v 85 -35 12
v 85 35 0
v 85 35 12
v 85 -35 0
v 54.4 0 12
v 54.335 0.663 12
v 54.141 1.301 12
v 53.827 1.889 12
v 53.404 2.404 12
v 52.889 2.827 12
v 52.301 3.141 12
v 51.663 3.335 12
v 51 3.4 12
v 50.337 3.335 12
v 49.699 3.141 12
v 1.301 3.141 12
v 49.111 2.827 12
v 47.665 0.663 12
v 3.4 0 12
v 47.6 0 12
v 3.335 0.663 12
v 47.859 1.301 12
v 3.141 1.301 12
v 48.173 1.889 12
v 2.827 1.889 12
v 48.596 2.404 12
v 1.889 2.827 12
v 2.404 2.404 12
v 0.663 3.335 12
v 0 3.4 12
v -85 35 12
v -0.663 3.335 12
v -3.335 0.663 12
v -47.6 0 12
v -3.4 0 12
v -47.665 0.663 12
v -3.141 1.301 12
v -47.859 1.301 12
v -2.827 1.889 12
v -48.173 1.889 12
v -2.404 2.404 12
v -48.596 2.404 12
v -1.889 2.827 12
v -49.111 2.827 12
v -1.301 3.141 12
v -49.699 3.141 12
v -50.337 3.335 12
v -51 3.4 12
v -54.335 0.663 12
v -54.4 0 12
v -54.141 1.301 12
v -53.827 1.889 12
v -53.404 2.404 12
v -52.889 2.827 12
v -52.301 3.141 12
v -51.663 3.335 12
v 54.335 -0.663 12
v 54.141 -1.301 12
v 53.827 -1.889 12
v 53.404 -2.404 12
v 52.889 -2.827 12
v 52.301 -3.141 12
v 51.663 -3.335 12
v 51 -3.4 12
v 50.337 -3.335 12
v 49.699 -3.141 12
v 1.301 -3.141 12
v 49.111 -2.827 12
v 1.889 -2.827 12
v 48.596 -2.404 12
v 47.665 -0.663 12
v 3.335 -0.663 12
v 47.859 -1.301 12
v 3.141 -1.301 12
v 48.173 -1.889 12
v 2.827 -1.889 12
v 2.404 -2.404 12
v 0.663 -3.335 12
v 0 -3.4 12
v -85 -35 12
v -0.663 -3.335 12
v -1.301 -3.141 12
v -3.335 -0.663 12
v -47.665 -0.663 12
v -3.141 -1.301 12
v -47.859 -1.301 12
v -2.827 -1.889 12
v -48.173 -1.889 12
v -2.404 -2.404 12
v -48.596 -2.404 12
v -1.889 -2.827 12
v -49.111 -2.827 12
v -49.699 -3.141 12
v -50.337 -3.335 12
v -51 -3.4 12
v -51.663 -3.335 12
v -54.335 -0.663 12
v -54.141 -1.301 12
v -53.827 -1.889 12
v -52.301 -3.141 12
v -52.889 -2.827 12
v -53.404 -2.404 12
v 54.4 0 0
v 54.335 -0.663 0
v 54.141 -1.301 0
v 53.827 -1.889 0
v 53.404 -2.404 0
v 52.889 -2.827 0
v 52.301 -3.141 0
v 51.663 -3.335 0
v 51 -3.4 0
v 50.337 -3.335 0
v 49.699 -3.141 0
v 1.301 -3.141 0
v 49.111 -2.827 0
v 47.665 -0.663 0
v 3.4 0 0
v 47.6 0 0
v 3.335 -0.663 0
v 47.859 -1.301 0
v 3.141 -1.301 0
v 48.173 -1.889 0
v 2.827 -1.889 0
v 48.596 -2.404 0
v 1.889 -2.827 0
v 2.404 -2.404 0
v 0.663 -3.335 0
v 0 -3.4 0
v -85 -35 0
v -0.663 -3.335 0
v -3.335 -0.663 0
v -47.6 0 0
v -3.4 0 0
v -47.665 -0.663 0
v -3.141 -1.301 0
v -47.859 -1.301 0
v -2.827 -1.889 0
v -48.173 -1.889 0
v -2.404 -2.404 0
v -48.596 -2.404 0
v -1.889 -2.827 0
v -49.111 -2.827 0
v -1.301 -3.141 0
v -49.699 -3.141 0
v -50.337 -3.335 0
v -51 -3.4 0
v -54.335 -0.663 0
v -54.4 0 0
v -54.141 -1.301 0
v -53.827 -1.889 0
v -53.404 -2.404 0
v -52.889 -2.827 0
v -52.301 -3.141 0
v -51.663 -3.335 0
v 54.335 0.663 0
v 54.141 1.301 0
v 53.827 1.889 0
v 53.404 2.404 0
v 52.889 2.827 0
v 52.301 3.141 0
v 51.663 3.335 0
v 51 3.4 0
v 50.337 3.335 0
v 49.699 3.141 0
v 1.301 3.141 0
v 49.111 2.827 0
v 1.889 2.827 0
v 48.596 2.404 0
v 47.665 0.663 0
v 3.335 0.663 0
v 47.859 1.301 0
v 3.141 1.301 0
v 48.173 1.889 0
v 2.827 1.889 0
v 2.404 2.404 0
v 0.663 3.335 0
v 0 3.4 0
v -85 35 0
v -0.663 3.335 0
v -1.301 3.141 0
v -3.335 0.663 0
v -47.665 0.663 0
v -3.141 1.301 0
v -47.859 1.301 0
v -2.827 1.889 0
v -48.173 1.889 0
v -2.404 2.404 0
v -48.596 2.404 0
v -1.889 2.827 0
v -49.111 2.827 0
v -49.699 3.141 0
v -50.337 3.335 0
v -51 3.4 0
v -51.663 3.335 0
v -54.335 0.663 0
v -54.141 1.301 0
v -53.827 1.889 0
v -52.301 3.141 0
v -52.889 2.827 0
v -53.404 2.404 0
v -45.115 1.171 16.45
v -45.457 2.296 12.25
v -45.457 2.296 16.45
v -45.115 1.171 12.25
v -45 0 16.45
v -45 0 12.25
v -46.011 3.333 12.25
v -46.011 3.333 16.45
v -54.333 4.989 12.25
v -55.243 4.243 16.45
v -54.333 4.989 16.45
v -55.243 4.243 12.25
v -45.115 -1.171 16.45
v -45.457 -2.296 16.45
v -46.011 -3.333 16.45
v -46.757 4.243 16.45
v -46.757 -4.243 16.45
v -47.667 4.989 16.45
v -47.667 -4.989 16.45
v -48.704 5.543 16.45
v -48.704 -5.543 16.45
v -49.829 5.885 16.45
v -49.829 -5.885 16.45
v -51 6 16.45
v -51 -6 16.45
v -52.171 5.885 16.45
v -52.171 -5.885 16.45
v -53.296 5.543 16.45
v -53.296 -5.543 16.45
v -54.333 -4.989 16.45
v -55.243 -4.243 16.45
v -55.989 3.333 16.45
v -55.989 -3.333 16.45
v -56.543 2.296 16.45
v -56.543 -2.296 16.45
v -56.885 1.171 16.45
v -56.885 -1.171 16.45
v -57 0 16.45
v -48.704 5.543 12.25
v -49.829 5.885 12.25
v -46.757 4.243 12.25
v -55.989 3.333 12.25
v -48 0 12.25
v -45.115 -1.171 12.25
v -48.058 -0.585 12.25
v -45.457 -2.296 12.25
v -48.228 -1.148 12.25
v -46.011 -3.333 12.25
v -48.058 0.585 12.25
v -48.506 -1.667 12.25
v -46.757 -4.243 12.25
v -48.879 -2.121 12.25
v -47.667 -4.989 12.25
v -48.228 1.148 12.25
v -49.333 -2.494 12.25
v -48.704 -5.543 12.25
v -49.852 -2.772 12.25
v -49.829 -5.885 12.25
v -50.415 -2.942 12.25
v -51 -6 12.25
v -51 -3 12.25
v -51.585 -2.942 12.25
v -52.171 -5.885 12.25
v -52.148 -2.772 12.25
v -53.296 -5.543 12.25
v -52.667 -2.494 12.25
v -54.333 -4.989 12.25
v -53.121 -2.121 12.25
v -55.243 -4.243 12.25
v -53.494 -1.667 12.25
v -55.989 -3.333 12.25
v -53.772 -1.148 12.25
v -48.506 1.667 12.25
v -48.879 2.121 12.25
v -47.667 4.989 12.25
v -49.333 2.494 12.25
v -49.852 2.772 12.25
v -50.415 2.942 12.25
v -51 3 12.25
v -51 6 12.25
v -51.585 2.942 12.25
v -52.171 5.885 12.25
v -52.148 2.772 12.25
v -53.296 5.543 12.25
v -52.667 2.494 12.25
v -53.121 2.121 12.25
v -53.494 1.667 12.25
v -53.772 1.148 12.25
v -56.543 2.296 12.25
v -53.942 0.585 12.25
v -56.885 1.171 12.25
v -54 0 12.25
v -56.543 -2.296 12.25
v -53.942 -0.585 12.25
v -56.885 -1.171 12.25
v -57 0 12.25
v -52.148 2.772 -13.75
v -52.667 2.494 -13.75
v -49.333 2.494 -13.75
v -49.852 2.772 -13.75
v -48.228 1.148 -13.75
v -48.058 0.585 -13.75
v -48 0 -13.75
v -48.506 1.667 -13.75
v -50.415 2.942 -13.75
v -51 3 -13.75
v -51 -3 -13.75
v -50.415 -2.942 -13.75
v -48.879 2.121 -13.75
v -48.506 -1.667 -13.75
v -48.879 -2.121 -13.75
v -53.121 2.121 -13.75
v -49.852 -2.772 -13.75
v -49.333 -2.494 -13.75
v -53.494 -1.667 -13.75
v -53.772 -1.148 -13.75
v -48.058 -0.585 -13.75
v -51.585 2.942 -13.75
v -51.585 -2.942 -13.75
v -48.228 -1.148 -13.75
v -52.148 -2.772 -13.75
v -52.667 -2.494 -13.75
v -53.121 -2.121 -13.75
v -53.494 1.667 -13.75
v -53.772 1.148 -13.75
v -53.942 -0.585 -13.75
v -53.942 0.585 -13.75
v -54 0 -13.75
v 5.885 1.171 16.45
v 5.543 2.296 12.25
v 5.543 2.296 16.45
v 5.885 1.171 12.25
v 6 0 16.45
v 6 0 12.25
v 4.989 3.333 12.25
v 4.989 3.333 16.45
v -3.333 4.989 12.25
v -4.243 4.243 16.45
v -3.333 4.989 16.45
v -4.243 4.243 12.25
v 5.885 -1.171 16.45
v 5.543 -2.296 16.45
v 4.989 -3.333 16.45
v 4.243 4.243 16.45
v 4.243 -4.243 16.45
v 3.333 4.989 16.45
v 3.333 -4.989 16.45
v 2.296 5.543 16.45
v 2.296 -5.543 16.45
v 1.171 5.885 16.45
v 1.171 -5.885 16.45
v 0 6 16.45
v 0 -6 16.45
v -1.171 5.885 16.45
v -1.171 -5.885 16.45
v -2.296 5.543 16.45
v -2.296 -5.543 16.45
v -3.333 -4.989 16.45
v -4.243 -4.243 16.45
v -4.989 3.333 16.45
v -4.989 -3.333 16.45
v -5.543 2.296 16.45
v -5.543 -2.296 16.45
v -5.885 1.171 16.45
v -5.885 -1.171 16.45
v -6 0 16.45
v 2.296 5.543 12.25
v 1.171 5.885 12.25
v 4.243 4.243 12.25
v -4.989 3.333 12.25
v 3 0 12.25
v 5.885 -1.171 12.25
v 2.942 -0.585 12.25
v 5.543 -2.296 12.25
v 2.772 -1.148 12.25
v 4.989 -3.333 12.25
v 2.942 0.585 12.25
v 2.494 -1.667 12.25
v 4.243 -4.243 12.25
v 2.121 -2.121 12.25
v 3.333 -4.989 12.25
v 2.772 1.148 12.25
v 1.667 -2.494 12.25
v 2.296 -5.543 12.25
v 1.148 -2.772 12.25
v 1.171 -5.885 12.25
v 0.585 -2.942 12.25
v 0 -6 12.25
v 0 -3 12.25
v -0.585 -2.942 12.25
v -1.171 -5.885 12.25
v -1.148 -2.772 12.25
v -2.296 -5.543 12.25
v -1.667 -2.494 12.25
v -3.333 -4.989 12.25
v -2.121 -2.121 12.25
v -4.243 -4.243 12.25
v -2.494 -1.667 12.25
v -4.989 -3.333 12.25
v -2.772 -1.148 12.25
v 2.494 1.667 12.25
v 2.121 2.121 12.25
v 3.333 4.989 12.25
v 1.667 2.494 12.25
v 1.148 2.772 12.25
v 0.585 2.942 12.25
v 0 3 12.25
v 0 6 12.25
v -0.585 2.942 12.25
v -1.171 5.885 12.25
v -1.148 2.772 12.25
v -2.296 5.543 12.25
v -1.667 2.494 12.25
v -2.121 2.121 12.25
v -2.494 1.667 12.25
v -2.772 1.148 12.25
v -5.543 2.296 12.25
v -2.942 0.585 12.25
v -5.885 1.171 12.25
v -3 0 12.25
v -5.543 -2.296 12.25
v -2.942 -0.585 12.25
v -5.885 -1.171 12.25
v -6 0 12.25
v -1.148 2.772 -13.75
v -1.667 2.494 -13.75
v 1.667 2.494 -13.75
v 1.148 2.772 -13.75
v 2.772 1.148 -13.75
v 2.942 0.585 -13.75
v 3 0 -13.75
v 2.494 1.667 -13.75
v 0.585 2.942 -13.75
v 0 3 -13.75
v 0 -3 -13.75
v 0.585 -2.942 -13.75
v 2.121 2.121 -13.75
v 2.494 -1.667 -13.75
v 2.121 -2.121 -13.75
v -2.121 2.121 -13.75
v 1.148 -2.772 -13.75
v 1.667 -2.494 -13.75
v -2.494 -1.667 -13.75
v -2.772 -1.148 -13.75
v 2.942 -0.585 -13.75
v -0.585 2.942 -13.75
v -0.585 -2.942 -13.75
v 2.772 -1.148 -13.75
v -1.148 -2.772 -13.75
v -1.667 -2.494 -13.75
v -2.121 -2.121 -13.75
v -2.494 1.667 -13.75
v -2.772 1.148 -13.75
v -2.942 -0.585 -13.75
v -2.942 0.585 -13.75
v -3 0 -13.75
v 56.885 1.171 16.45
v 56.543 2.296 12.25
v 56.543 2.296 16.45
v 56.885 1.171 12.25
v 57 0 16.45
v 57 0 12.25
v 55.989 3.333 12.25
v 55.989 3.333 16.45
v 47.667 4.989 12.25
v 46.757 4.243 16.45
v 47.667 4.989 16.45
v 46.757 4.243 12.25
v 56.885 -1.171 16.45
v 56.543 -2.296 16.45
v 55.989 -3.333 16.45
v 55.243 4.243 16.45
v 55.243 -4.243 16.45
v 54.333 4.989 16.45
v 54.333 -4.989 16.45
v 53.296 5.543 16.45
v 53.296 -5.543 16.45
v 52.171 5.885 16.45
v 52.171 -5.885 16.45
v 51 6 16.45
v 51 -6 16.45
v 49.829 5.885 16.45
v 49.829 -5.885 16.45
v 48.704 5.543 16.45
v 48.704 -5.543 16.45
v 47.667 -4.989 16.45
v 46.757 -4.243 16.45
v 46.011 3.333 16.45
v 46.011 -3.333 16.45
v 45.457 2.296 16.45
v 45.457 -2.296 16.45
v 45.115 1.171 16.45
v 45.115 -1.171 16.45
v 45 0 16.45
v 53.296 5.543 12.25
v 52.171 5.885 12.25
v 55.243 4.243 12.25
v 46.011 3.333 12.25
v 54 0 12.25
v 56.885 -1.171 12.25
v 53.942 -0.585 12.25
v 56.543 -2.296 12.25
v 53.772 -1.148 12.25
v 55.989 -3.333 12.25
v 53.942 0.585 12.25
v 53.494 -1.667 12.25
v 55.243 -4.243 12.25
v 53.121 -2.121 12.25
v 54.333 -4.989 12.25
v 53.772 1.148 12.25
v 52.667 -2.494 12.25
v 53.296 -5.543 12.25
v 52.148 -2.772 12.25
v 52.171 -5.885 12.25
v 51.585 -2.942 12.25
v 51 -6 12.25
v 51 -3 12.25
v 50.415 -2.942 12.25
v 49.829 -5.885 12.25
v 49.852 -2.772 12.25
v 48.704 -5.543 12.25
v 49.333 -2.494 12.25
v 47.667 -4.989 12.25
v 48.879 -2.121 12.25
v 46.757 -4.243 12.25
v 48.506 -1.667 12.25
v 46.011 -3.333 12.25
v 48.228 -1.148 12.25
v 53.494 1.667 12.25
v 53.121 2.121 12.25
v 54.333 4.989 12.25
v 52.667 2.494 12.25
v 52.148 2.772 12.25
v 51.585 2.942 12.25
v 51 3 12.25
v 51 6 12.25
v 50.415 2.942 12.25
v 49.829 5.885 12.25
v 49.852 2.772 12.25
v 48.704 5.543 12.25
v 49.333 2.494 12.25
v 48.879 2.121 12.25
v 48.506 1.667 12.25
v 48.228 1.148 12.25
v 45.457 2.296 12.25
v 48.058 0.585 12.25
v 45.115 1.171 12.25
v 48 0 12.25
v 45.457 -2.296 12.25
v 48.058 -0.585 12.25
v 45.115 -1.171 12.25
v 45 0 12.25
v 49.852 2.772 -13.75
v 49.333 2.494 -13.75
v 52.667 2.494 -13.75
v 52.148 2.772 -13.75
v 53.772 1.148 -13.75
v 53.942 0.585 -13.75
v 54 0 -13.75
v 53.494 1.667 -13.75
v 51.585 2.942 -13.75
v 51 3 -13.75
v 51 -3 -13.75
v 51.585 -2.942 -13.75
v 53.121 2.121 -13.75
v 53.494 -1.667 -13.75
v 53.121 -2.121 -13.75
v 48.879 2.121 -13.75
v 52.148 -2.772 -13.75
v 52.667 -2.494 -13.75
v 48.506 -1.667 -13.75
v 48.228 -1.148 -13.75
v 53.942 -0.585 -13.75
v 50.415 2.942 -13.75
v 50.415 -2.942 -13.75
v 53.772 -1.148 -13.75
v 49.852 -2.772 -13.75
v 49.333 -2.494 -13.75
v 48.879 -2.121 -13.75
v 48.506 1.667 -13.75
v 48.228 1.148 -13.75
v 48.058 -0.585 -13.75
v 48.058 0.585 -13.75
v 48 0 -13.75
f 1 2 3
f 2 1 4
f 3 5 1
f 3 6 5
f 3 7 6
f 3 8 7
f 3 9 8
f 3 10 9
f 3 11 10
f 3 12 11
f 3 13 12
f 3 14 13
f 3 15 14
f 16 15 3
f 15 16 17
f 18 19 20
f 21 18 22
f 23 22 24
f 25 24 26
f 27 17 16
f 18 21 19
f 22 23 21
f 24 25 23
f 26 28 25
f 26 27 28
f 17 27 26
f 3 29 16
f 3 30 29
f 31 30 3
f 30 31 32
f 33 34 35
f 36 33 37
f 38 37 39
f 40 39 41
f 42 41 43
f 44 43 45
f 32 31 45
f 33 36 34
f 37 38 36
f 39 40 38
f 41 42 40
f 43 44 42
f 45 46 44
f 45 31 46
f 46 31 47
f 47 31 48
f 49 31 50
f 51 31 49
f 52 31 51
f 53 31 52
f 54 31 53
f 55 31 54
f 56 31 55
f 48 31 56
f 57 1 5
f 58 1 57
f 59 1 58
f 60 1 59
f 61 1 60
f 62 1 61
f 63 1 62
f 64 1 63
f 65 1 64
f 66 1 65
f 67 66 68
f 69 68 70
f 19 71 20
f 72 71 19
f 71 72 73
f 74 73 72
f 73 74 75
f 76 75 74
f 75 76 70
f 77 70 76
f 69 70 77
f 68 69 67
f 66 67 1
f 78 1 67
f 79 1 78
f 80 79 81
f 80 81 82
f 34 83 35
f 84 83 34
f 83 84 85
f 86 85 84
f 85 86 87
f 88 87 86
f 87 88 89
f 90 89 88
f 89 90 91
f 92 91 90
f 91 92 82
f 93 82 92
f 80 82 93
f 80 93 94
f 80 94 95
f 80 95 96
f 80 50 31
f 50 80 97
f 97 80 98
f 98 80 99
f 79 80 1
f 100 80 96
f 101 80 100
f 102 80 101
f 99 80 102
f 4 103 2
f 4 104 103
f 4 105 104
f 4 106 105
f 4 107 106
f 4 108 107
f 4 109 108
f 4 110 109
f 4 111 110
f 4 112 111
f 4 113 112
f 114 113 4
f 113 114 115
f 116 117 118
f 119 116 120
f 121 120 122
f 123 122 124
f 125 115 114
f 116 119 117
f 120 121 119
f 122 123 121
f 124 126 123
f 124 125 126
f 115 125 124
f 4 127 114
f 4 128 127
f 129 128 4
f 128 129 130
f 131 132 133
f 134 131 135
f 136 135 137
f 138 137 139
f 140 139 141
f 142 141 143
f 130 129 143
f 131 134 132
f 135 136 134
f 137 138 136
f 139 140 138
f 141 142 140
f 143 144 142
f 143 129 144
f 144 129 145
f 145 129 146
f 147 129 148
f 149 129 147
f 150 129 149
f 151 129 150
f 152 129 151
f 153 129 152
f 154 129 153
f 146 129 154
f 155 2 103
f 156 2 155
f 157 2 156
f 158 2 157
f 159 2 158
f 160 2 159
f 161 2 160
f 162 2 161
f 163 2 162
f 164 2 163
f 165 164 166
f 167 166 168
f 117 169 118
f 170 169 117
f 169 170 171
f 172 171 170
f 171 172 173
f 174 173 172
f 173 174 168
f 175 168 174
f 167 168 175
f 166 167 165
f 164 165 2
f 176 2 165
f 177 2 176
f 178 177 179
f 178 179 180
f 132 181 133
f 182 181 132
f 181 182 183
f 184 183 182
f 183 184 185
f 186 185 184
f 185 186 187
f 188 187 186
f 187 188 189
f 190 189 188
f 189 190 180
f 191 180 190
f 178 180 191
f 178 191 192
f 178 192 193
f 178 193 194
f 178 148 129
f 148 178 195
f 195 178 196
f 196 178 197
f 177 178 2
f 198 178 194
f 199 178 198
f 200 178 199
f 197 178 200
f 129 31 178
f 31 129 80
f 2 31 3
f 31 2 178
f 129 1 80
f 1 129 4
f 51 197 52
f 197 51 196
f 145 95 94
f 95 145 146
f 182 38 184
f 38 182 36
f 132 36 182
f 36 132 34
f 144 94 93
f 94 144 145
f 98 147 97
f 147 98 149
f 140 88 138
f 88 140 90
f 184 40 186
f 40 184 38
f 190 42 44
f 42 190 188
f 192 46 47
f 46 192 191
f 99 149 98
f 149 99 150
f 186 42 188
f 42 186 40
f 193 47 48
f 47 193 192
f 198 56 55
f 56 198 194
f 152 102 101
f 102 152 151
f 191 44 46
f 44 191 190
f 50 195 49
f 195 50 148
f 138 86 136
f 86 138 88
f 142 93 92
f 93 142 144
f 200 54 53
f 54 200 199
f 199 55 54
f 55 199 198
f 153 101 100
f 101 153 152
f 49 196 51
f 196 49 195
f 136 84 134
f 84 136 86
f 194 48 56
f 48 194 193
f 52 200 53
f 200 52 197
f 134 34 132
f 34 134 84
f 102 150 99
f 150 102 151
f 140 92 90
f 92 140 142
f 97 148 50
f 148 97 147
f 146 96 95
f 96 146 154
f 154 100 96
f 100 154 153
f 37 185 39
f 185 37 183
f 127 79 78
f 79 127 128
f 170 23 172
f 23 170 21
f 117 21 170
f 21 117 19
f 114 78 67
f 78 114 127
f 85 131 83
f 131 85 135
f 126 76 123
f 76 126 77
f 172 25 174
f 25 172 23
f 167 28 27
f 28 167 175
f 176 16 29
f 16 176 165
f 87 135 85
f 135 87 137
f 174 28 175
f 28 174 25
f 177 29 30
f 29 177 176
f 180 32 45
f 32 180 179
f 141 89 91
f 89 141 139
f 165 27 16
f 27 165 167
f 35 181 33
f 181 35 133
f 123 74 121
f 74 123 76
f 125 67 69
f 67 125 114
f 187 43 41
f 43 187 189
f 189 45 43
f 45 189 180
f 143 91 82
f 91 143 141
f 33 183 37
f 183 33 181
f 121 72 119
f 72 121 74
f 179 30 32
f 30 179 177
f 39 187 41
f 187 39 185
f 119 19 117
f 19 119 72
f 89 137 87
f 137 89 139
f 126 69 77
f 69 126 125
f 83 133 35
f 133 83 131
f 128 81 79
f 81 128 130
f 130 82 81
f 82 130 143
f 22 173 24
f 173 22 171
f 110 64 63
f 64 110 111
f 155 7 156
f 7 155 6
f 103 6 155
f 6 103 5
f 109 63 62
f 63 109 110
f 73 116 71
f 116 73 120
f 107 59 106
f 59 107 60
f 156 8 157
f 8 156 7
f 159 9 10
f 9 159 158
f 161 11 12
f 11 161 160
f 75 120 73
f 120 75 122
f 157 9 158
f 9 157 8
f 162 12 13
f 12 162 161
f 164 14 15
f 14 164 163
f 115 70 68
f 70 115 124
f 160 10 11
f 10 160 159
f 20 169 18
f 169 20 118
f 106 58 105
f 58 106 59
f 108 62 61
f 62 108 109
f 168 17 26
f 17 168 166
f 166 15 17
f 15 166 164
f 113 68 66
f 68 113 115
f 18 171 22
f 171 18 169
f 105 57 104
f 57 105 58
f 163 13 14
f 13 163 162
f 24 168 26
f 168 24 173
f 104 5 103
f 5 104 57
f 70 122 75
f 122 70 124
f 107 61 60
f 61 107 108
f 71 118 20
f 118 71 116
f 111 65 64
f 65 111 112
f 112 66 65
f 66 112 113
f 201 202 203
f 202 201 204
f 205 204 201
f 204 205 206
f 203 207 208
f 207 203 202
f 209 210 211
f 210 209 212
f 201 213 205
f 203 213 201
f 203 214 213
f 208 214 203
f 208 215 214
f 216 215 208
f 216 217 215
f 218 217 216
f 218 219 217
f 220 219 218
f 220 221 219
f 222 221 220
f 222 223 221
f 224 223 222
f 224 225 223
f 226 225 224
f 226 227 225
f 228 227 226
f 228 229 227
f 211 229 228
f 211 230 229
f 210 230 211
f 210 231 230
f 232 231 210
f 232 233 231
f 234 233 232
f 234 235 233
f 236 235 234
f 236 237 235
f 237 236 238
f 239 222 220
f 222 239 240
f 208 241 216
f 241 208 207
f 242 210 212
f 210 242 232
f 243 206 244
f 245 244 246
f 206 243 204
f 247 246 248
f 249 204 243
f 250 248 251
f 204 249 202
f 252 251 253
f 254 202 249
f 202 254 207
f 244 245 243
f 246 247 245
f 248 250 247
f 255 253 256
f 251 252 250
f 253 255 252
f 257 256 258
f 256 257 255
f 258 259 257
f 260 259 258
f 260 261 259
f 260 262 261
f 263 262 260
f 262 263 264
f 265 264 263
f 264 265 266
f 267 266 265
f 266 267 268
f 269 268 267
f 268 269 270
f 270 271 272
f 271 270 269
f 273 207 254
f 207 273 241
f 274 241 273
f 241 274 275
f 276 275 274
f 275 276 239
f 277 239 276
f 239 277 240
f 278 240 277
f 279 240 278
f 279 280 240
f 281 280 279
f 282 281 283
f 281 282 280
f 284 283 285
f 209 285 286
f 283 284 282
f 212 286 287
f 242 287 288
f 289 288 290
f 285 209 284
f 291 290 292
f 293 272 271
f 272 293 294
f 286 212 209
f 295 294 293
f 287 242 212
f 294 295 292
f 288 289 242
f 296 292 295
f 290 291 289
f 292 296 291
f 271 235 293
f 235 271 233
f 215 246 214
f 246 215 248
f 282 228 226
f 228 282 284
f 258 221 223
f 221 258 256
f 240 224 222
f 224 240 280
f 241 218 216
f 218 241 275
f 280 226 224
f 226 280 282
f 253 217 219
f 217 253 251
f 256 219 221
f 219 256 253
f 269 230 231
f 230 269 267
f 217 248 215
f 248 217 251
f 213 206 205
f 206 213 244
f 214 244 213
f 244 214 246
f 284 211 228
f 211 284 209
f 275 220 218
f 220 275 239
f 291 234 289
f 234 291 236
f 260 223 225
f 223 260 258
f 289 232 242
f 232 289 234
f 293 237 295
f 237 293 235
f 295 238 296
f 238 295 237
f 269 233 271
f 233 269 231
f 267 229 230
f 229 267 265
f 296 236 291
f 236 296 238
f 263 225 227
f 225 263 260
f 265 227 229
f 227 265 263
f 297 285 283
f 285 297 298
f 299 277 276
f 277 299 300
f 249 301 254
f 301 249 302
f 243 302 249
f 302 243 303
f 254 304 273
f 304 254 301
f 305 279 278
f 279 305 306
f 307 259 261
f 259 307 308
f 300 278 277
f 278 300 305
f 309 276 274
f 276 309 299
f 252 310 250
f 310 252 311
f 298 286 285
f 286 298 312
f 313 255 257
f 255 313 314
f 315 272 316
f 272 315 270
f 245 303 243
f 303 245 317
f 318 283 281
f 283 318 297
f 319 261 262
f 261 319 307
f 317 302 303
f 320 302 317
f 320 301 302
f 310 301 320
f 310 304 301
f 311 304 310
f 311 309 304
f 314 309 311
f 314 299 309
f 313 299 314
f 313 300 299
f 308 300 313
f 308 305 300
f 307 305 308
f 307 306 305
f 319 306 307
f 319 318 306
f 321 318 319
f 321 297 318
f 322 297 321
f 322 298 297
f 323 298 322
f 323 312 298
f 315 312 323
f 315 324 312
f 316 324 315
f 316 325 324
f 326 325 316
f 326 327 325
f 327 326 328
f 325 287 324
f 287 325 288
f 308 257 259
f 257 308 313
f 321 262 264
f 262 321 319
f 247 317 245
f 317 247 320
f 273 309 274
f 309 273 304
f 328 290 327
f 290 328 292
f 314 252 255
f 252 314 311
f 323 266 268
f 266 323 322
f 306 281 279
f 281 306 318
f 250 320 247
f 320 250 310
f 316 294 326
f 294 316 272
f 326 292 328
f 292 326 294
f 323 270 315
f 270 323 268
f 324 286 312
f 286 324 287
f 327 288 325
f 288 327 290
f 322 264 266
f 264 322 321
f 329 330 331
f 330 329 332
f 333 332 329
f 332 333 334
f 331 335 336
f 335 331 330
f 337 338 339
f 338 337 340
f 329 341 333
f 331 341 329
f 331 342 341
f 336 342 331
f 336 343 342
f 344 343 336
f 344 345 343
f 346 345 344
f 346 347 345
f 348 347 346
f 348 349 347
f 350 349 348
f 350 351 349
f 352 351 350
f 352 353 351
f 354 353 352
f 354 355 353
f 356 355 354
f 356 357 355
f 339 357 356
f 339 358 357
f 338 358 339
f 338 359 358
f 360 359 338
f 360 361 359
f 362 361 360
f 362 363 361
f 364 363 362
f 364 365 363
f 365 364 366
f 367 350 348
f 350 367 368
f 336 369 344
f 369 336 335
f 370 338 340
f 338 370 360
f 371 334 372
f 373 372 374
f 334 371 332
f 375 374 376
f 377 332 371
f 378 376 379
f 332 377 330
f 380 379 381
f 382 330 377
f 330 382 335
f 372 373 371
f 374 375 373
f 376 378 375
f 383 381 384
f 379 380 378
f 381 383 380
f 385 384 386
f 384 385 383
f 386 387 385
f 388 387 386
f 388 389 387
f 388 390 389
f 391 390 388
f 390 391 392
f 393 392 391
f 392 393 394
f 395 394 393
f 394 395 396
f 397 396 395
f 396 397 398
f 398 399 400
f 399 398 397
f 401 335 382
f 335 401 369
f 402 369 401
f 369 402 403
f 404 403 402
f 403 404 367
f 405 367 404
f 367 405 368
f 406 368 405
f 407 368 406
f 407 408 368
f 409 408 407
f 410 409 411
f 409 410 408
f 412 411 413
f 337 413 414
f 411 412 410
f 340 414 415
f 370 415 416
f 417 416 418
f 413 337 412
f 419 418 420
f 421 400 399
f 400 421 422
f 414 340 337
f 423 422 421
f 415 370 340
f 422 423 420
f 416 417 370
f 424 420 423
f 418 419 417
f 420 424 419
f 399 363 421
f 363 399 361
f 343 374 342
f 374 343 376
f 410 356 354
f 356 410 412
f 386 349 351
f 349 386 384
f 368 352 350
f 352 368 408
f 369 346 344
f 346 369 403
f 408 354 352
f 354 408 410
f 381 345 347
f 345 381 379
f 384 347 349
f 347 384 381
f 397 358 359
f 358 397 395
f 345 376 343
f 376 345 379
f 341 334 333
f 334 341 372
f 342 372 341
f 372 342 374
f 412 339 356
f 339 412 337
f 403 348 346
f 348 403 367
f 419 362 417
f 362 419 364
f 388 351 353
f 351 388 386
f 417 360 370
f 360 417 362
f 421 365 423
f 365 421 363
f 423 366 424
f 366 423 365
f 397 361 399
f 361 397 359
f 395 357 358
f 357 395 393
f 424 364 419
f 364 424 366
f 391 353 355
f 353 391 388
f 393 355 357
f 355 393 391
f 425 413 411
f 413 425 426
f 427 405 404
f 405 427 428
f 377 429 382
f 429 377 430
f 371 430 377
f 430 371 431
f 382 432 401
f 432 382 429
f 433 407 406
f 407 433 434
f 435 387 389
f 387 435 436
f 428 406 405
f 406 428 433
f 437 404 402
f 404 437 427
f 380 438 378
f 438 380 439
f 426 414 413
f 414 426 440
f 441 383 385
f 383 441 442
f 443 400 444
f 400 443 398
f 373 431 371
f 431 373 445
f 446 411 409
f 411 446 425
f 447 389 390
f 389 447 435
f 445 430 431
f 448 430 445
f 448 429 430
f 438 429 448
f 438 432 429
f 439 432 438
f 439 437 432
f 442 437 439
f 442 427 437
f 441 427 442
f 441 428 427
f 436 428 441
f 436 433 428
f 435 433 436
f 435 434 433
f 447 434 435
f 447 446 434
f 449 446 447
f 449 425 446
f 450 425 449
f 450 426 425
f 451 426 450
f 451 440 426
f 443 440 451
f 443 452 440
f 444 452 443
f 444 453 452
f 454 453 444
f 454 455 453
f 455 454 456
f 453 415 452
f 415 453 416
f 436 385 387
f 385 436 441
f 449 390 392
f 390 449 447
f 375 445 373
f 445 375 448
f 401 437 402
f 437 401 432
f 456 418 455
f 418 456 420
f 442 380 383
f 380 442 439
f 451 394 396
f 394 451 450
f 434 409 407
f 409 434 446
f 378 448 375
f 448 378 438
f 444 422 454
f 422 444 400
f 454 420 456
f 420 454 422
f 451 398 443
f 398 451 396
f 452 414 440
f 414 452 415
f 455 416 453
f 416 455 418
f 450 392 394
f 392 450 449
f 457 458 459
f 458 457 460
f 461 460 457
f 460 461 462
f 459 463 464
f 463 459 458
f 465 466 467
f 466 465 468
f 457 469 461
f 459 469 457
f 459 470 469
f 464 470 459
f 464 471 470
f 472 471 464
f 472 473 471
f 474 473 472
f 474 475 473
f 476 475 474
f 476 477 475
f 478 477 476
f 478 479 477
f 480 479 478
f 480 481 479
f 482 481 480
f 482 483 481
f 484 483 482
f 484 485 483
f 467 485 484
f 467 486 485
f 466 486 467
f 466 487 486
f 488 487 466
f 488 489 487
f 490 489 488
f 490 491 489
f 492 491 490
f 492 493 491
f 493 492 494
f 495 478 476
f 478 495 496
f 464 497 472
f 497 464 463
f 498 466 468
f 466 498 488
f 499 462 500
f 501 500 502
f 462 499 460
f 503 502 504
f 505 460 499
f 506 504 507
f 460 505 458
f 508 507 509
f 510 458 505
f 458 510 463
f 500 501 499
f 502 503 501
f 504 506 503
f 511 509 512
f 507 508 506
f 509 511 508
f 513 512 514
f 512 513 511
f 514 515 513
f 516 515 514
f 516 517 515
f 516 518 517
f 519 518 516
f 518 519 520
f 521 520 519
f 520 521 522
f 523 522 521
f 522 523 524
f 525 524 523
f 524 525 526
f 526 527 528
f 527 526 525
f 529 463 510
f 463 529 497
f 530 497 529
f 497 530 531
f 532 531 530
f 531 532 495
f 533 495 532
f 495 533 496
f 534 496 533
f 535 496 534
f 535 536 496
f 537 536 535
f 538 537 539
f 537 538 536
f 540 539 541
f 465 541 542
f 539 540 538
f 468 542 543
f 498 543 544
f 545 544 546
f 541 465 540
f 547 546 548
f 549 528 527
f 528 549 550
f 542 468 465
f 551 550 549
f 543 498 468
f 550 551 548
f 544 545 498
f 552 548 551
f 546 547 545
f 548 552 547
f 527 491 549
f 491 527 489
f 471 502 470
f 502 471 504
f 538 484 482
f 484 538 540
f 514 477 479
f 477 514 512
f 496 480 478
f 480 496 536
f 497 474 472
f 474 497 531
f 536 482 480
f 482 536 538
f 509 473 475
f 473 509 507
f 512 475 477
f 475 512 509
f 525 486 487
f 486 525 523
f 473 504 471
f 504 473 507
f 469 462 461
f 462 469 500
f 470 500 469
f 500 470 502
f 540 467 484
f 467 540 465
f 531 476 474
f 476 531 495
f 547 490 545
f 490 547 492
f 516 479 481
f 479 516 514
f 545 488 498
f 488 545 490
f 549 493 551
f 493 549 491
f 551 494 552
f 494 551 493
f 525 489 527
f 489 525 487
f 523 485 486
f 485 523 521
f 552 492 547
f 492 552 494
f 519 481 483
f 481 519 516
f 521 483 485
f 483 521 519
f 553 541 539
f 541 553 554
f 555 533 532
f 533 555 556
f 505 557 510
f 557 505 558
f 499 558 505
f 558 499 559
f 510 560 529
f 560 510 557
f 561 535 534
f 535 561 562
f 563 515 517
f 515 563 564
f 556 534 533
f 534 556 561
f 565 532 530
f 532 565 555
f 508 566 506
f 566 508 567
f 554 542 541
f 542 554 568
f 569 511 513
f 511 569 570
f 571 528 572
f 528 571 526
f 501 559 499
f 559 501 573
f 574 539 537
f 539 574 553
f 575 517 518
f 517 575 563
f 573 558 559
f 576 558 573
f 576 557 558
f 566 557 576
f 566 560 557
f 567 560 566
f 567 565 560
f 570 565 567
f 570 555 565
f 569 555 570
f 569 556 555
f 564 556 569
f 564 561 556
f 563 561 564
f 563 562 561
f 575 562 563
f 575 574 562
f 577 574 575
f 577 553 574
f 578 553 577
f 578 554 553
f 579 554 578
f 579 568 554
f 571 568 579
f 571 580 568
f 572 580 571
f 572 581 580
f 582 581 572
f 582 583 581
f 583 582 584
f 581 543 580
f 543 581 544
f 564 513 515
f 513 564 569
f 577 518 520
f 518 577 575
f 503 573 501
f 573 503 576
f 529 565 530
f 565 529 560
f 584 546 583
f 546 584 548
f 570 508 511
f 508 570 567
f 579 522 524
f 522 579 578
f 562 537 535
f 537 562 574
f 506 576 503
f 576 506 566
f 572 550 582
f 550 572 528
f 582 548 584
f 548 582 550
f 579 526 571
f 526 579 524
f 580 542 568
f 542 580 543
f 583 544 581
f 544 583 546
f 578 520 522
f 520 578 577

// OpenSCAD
$fn = 32;

// ------------------------------------------------------------------------
// Bolted plate: 170 x 70 x 12 mm plate, 3 fasteners
// Every part is its own module, assembly() places them once.
// ------------------------------------------------------------------------

// --- part 1 ---
module plate() {
  difference() {
    translate([-85, -35, 0]) cube([170, 70, 12]);
    translate([-51, 0, -1]) cylinder(h = 14, d = 6.8);
    translate([0, 0, -1]) cylinder(h = 14, d = 6.8);
    translate([51, 0, -1]) cylinder(h = 14, d = 6.8);
  }
}

// --- part 2 ---
module bolt1() {
  cylinder(h = 4.2, d = 12);
  translate([0, 0, -26]) cylinder(h = 26, d = 6);
}

// --- part 3 ---
module bolt2() {
  cylinder(h = 4.2, d = 12);
  translate([0, 0, -26]) cylinder(h = 26, d = 6);
}

// --- part 4 ---
module bolt3() {
  cylinder(h = 4.2, d = 12);
  translate([0, 0, -26]) cylinder(h = 26, d = 6);
}

// --- assembly ---
module assembly() {
  translate([0, 0, 0]) rotate([0, 0, 0]) plate();
  translate([-51, 0, 12.25]) rotate([0, 0, 0]) bolt1();
  translate([0, 0, 12.25]) rotate([0, 0, 0]) bolt2();
  translate([51, 0, 12.25]) rotate([0, 0, 0]) bolt3();
}

assembly();
